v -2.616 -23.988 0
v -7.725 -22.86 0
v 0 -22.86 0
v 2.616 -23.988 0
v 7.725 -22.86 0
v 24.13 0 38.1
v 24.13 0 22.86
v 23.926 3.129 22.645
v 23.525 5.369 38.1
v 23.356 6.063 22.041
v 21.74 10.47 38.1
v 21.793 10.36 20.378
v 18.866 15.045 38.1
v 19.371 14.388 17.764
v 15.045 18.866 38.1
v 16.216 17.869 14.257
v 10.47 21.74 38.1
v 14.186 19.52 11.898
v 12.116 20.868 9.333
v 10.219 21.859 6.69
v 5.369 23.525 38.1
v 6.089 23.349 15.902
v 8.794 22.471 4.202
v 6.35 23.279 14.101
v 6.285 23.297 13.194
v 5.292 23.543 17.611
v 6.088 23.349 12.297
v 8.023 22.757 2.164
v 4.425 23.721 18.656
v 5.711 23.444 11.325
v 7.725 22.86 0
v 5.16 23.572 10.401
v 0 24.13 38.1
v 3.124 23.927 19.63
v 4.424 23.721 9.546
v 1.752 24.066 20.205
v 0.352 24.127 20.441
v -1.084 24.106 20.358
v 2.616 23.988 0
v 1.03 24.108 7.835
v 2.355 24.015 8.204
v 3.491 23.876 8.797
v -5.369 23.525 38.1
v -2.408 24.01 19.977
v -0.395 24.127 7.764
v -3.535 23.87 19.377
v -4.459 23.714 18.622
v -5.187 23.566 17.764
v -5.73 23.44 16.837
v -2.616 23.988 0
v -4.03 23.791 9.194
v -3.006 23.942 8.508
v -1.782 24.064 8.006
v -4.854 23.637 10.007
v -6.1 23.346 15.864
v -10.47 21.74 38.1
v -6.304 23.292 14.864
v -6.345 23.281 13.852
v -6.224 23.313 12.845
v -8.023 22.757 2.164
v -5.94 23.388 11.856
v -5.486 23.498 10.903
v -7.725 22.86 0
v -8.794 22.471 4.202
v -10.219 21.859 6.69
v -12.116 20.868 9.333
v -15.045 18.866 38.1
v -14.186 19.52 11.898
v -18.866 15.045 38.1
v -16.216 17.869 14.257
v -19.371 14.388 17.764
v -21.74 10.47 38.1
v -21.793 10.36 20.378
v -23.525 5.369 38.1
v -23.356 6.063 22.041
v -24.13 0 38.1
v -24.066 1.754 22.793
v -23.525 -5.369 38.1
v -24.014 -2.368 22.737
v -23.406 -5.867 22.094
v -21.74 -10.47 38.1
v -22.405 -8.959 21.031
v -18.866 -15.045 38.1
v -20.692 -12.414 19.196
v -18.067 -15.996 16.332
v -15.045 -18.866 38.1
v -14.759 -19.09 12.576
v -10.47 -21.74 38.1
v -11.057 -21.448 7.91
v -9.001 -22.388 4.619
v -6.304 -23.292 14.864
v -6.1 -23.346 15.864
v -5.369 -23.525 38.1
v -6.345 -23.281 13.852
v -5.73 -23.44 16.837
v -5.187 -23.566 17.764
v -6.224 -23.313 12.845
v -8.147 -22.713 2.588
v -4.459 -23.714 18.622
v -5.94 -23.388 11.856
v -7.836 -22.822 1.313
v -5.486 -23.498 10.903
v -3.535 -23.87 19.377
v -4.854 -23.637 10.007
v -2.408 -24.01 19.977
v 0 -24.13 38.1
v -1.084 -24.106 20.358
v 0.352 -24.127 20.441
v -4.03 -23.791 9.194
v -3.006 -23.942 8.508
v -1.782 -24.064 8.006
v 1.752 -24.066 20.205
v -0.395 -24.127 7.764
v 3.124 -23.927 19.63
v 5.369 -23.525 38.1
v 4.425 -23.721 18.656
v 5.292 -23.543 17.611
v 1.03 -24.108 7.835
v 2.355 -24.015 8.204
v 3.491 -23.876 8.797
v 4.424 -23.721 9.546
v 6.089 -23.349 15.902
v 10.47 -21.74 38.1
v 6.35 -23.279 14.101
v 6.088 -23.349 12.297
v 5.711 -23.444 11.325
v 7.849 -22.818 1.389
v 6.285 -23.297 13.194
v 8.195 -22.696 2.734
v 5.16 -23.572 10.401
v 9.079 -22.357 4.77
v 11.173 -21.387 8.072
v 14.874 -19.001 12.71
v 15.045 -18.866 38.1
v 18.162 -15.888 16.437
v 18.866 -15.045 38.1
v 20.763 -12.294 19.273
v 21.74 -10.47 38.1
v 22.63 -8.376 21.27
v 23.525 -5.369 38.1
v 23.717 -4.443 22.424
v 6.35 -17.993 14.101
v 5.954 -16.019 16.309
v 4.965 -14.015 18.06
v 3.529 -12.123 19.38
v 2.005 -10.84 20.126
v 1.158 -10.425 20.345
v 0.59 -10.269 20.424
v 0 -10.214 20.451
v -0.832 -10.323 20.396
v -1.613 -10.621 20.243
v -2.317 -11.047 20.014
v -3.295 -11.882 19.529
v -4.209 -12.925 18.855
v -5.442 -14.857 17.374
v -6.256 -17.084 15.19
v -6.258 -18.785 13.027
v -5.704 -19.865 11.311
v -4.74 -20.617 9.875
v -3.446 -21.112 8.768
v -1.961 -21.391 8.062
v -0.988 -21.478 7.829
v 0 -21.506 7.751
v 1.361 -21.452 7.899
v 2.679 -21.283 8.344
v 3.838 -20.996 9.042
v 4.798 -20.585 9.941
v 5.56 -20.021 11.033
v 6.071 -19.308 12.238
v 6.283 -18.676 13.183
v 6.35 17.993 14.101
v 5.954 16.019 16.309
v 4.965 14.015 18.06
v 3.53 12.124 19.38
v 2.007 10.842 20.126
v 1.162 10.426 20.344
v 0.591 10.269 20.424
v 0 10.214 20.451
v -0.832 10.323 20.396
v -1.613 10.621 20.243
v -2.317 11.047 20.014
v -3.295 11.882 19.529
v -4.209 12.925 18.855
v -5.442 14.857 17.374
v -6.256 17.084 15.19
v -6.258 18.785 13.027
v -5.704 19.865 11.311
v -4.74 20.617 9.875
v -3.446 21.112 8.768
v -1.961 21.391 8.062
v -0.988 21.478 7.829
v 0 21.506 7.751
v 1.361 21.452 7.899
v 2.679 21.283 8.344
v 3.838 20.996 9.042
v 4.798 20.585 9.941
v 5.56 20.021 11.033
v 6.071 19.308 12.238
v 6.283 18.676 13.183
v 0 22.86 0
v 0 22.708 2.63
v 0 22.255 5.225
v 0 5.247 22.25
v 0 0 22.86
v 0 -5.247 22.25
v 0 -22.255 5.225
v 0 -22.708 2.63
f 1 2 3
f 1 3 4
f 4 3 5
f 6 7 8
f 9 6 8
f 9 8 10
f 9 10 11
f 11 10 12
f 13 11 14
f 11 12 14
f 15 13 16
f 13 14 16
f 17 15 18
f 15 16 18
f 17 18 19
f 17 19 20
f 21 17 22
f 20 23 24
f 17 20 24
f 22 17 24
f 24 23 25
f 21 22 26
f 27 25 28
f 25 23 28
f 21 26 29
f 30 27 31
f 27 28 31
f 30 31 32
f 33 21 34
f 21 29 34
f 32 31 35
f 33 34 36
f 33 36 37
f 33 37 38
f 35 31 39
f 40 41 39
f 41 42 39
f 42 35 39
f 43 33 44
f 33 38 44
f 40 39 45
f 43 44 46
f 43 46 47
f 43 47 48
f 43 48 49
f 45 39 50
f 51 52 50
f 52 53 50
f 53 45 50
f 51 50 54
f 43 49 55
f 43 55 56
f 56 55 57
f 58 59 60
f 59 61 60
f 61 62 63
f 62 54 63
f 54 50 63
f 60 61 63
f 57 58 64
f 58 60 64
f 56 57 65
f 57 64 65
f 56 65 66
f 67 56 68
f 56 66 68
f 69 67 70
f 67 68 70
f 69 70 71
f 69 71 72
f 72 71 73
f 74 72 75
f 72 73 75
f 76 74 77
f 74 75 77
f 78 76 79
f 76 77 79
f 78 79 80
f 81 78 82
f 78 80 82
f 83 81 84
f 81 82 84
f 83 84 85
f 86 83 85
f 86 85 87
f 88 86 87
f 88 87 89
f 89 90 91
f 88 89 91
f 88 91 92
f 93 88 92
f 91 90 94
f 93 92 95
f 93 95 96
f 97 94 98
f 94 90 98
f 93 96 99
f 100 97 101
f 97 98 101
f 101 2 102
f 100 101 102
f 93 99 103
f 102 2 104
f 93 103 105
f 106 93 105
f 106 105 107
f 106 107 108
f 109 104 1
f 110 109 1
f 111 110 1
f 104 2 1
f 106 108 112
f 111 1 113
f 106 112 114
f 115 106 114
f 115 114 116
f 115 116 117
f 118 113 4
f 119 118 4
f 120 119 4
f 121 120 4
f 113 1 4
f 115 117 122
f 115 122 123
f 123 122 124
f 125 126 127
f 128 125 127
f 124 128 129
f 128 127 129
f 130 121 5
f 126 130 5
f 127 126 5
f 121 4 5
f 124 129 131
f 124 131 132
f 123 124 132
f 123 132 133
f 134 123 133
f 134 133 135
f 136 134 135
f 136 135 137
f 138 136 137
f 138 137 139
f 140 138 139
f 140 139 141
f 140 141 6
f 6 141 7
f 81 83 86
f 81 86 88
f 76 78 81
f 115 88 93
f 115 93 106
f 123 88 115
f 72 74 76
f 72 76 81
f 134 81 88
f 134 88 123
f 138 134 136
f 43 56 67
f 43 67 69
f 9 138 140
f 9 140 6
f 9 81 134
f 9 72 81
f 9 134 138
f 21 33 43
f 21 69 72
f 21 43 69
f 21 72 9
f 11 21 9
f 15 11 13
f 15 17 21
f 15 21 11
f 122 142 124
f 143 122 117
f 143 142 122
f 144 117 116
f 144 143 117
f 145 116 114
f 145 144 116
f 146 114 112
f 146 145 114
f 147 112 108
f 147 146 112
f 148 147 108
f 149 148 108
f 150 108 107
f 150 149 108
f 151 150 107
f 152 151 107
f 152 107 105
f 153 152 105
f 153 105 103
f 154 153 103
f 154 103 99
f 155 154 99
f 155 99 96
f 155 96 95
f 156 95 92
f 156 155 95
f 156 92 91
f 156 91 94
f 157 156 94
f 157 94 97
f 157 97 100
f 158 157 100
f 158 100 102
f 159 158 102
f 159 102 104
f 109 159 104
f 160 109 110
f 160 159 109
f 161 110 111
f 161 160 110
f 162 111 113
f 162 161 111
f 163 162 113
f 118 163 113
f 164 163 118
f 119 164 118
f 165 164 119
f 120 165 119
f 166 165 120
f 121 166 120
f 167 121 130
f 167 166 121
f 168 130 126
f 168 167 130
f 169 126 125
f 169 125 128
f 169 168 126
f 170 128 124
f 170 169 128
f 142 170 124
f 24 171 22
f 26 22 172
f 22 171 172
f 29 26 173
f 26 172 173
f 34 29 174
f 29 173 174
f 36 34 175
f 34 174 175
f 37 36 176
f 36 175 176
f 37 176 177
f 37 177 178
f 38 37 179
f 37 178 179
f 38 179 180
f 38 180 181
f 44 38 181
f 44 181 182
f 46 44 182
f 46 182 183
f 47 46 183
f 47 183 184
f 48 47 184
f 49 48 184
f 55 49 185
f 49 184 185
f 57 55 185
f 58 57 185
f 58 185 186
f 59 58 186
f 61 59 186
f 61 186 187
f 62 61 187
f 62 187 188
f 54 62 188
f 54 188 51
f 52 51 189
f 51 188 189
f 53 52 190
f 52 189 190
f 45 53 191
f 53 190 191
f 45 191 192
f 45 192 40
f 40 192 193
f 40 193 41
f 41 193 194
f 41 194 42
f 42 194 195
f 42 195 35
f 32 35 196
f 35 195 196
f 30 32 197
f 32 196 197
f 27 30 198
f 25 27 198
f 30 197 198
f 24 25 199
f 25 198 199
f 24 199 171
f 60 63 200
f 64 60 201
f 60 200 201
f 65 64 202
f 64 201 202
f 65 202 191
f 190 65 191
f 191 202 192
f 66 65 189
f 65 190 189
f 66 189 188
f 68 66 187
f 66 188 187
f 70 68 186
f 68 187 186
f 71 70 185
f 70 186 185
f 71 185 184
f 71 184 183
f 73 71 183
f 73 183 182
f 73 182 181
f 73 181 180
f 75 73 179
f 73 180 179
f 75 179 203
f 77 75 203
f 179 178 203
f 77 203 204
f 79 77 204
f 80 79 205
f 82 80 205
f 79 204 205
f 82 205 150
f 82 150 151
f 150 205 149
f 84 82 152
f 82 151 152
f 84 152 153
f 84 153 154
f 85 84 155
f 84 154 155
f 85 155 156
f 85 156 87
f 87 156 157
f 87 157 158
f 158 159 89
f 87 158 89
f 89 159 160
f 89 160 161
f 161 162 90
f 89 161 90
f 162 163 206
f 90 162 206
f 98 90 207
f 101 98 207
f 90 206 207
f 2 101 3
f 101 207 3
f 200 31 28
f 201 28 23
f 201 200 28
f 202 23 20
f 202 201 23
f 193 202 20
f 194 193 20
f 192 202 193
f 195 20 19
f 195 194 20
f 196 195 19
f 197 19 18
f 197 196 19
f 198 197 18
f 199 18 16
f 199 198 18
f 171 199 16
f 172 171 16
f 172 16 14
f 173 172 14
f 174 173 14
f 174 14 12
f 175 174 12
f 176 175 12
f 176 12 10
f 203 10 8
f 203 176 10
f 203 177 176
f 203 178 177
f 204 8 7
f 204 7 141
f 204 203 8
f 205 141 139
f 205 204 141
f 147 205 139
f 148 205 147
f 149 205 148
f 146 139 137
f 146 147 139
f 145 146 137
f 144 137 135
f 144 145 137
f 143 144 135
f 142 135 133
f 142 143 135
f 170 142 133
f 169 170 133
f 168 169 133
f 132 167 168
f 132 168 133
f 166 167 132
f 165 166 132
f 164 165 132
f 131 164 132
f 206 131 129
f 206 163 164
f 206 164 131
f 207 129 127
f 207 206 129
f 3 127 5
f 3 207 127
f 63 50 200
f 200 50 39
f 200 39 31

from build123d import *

# Parameters (mm, degrees)
F0_R          = 24.13
F1_DEPTH      = 38.1
F2_R          = 22.86
F3_DEPTH      = 25.4
F3_DEPTH_BACK = 25.4
F5_R          = 6.35
F6_DEPTH      = 25.4
F6_DEPTH_BACK = 25.4


with BuildPart() as f1:
    # F0 (on Top) → F1 (new body)
    with BuildSketch(Plane.XY):
        Circle(F0_R)
    extrude(amount=F1_DEPTH)

    # F2 (on Right) → F3 (cut, two sides)
    with BuildSketch(Plane.YZ) as f3_sk:
        Circle(F2_R)
    extrude(amount=-F3_DEPTH, mode=Mode.SUBTRACT)
    extrude(f3_sk.sketch, amount=F3_DEPTH_BACK, mode=Mode.SUBTRACT)

    # F5 (on face) → F6 (cut, two sides)
    with BuildSketch(Plane.XZ) as f6_sk:
        with Locations((0, 14.1012268141)):
            Circle(F5_R)
    extrude(amount=-F6_DEPTH, mode=Mode.SUBTRACT)
    extrude(f6_sk.sketch, amount=F6_DEPTH_BACK, mode=Mode.SUBTRACT)


solid = f1.part
